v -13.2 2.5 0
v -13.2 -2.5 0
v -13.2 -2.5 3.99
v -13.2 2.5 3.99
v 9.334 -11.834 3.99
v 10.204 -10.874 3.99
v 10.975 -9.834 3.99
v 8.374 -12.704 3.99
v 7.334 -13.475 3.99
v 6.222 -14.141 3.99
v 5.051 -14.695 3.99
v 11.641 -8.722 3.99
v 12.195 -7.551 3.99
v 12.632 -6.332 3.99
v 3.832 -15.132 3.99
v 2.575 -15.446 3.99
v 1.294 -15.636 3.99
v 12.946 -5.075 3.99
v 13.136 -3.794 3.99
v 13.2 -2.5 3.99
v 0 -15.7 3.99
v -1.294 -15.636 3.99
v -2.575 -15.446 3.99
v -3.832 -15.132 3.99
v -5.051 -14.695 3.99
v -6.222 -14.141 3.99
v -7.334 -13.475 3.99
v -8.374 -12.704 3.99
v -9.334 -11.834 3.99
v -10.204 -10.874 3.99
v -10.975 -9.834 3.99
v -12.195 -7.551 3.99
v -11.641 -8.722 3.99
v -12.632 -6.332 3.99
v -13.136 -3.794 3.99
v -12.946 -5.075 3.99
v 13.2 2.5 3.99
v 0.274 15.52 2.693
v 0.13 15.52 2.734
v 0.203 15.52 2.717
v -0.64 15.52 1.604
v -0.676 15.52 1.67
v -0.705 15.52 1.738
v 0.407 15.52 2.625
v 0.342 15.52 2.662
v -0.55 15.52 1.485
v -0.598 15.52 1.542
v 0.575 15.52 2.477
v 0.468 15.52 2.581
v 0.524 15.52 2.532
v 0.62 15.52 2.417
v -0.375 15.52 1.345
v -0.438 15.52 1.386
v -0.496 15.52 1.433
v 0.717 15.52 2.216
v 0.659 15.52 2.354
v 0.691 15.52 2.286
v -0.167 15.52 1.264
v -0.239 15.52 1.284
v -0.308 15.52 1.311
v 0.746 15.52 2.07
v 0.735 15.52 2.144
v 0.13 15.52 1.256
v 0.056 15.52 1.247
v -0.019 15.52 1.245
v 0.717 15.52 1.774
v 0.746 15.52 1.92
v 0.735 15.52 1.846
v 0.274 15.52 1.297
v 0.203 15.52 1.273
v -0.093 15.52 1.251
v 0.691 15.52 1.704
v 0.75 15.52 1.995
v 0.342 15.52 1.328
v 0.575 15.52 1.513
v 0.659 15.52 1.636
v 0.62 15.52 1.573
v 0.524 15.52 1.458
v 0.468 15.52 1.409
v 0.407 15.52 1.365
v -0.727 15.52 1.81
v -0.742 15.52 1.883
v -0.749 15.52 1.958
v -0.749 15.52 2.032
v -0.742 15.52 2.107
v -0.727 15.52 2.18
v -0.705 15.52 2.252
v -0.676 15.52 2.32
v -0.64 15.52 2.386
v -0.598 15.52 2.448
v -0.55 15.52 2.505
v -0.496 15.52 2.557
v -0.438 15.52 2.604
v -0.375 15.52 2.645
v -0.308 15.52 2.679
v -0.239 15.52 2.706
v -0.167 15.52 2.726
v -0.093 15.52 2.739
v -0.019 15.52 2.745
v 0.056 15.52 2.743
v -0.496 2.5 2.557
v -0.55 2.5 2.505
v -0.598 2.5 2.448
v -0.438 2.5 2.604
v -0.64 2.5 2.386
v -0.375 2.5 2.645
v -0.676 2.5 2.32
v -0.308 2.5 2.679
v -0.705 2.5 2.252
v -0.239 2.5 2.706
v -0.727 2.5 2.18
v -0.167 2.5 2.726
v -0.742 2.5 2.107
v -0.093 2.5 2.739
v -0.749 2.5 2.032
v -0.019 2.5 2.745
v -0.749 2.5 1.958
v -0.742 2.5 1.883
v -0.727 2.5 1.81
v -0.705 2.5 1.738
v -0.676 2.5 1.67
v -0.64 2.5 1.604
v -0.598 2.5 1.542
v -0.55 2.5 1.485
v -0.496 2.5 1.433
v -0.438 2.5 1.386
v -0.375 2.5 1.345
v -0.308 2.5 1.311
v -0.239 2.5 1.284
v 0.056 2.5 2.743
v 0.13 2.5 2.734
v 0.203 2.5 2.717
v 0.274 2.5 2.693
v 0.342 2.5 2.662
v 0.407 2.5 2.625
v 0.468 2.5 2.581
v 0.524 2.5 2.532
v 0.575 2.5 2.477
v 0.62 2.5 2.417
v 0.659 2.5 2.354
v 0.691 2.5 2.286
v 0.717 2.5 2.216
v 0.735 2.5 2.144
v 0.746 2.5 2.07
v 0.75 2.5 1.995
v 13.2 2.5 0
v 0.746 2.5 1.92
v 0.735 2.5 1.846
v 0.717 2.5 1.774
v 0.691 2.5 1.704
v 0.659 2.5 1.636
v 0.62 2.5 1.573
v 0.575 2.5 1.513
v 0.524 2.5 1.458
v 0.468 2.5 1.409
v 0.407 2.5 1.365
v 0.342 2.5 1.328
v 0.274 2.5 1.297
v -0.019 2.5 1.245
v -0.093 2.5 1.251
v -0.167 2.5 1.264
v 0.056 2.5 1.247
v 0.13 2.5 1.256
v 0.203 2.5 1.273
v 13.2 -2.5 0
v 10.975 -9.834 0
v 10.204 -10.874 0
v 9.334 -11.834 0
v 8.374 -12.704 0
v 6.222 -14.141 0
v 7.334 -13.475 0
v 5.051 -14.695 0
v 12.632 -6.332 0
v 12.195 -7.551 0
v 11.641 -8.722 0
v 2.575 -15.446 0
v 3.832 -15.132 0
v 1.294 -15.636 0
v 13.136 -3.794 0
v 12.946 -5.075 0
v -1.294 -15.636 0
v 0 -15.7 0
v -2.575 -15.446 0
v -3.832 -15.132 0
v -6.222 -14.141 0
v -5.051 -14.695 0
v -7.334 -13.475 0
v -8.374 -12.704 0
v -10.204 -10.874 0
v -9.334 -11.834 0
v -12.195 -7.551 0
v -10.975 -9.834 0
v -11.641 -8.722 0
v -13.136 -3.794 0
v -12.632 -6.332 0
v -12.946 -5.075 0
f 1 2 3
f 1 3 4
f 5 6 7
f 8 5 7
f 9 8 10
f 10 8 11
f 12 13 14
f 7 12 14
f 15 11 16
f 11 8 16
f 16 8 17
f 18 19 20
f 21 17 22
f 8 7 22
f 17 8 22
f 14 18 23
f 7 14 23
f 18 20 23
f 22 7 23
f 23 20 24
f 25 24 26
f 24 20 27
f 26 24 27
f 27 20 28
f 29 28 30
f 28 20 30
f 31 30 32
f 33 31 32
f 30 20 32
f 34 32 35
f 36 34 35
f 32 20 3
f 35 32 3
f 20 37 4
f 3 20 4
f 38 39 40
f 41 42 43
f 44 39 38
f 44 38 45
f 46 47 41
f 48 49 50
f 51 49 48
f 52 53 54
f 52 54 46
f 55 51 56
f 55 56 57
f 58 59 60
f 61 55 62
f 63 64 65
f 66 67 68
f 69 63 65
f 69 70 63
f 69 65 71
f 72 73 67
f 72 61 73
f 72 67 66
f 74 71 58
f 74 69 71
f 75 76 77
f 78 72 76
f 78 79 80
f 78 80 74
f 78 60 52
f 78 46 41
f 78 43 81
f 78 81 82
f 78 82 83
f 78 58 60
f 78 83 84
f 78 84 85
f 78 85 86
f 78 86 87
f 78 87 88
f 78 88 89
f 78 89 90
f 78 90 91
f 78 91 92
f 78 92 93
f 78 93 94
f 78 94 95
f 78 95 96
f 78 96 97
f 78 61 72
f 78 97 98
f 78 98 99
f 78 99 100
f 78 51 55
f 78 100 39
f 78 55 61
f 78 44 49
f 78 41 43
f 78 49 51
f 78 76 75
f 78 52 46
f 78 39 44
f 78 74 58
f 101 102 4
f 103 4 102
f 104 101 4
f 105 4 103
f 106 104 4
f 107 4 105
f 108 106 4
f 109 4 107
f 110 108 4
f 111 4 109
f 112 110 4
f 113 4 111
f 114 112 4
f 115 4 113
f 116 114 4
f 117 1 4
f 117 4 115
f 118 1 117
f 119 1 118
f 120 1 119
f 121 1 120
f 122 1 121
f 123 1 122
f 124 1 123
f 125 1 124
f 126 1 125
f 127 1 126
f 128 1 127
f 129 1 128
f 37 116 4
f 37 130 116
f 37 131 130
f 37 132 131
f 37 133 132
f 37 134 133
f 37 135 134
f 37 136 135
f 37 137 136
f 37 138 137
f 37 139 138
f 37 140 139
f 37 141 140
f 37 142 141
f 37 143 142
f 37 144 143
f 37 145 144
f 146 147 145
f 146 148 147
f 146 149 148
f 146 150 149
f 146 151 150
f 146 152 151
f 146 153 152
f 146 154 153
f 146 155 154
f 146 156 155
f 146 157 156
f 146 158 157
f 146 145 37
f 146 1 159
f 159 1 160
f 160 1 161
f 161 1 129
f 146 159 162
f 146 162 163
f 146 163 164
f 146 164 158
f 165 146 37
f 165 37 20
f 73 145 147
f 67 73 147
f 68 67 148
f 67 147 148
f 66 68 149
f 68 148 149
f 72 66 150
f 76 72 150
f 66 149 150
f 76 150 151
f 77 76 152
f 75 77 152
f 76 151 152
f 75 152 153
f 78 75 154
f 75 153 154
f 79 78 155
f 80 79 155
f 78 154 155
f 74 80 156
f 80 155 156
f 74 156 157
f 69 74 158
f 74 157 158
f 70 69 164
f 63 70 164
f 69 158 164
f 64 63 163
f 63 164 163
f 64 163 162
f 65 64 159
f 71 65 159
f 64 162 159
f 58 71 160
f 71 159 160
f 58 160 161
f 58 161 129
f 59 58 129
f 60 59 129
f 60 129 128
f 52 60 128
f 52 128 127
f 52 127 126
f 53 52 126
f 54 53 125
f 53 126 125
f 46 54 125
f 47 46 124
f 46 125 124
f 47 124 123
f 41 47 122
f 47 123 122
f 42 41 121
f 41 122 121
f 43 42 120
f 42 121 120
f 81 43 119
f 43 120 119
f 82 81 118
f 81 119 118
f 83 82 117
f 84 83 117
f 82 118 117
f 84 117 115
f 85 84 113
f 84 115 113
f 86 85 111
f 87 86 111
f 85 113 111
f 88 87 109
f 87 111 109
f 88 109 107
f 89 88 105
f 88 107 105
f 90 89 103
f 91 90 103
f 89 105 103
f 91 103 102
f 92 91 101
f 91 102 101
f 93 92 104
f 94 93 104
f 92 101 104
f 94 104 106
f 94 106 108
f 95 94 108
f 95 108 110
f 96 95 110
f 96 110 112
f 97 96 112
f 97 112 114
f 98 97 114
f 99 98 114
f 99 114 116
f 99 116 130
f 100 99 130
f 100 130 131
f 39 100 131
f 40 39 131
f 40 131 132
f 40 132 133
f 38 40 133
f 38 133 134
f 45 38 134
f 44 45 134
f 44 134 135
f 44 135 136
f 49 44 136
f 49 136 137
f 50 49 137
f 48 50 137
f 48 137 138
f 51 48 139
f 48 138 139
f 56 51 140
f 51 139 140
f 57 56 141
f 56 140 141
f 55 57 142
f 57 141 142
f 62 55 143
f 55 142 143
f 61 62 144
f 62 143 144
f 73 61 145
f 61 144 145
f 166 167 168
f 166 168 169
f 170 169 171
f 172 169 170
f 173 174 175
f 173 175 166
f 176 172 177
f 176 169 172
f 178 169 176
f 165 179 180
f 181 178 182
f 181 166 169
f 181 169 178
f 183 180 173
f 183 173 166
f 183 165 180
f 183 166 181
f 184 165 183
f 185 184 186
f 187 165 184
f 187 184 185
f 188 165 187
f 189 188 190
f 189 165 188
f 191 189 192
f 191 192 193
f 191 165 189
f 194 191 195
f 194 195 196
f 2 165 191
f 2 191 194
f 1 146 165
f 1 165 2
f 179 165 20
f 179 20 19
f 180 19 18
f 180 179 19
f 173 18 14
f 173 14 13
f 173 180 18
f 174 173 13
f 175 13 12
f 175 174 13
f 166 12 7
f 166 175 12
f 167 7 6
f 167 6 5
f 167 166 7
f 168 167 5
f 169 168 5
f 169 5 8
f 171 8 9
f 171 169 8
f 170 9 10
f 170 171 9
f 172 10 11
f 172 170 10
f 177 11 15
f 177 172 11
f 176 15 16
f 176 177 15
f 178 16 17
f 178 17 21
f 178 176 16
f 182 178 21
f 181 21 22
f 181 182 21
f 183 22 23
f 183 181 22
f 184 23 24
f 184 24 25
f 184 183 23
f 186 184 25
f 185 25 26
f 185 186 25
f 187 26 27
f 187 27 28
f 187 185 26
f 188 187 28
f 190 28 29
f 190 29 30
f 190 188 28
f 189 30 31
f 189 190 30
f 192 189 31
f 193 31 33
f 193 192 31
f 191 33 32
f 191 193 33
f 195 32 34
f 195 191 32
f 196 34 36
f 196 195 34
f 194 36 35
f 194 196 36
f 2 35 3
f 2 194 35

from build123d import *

# Parameters (mm, degrees)
BOSS_EXTRUDE1_DEPTH = 3.99
SKETCH2_R           = 0.75
BOSS_EXTRUDE2_DEPTH = 13.019979


with BuildPart() as part:
    # Sketch1 → Boss-Extrude1 (new body)
    with BuildSketch(Plane.XY):
        with BuildLine():
            Line((-13.2, -2.5), (-13.2, 2.5))
            Line((-13.2, 2.5), (13.2, 2.5))
            Line((13.2, 2.5), (13.2, -2.5))
            ThreePointArc((13.2, -2.5), (0, -15.7), (-13.2, -2.5))
        make_face()
    extrude(amount=BOSS_EXTRUDE1_DEPTH)

    # Sketch2 → Boss-Extrude2 (add)
    with BuildSketch(Plane(origin=(0, 2.5, 0), x_dir=(1, 0, 0), z_dir=(0, 1, 0))):
        with Locations((0, -1.995)):
            Circle(SKETCH2_R)
    extrude(amount=BOSS_EXTRUDE2_DEPTH)


solid = part.part
